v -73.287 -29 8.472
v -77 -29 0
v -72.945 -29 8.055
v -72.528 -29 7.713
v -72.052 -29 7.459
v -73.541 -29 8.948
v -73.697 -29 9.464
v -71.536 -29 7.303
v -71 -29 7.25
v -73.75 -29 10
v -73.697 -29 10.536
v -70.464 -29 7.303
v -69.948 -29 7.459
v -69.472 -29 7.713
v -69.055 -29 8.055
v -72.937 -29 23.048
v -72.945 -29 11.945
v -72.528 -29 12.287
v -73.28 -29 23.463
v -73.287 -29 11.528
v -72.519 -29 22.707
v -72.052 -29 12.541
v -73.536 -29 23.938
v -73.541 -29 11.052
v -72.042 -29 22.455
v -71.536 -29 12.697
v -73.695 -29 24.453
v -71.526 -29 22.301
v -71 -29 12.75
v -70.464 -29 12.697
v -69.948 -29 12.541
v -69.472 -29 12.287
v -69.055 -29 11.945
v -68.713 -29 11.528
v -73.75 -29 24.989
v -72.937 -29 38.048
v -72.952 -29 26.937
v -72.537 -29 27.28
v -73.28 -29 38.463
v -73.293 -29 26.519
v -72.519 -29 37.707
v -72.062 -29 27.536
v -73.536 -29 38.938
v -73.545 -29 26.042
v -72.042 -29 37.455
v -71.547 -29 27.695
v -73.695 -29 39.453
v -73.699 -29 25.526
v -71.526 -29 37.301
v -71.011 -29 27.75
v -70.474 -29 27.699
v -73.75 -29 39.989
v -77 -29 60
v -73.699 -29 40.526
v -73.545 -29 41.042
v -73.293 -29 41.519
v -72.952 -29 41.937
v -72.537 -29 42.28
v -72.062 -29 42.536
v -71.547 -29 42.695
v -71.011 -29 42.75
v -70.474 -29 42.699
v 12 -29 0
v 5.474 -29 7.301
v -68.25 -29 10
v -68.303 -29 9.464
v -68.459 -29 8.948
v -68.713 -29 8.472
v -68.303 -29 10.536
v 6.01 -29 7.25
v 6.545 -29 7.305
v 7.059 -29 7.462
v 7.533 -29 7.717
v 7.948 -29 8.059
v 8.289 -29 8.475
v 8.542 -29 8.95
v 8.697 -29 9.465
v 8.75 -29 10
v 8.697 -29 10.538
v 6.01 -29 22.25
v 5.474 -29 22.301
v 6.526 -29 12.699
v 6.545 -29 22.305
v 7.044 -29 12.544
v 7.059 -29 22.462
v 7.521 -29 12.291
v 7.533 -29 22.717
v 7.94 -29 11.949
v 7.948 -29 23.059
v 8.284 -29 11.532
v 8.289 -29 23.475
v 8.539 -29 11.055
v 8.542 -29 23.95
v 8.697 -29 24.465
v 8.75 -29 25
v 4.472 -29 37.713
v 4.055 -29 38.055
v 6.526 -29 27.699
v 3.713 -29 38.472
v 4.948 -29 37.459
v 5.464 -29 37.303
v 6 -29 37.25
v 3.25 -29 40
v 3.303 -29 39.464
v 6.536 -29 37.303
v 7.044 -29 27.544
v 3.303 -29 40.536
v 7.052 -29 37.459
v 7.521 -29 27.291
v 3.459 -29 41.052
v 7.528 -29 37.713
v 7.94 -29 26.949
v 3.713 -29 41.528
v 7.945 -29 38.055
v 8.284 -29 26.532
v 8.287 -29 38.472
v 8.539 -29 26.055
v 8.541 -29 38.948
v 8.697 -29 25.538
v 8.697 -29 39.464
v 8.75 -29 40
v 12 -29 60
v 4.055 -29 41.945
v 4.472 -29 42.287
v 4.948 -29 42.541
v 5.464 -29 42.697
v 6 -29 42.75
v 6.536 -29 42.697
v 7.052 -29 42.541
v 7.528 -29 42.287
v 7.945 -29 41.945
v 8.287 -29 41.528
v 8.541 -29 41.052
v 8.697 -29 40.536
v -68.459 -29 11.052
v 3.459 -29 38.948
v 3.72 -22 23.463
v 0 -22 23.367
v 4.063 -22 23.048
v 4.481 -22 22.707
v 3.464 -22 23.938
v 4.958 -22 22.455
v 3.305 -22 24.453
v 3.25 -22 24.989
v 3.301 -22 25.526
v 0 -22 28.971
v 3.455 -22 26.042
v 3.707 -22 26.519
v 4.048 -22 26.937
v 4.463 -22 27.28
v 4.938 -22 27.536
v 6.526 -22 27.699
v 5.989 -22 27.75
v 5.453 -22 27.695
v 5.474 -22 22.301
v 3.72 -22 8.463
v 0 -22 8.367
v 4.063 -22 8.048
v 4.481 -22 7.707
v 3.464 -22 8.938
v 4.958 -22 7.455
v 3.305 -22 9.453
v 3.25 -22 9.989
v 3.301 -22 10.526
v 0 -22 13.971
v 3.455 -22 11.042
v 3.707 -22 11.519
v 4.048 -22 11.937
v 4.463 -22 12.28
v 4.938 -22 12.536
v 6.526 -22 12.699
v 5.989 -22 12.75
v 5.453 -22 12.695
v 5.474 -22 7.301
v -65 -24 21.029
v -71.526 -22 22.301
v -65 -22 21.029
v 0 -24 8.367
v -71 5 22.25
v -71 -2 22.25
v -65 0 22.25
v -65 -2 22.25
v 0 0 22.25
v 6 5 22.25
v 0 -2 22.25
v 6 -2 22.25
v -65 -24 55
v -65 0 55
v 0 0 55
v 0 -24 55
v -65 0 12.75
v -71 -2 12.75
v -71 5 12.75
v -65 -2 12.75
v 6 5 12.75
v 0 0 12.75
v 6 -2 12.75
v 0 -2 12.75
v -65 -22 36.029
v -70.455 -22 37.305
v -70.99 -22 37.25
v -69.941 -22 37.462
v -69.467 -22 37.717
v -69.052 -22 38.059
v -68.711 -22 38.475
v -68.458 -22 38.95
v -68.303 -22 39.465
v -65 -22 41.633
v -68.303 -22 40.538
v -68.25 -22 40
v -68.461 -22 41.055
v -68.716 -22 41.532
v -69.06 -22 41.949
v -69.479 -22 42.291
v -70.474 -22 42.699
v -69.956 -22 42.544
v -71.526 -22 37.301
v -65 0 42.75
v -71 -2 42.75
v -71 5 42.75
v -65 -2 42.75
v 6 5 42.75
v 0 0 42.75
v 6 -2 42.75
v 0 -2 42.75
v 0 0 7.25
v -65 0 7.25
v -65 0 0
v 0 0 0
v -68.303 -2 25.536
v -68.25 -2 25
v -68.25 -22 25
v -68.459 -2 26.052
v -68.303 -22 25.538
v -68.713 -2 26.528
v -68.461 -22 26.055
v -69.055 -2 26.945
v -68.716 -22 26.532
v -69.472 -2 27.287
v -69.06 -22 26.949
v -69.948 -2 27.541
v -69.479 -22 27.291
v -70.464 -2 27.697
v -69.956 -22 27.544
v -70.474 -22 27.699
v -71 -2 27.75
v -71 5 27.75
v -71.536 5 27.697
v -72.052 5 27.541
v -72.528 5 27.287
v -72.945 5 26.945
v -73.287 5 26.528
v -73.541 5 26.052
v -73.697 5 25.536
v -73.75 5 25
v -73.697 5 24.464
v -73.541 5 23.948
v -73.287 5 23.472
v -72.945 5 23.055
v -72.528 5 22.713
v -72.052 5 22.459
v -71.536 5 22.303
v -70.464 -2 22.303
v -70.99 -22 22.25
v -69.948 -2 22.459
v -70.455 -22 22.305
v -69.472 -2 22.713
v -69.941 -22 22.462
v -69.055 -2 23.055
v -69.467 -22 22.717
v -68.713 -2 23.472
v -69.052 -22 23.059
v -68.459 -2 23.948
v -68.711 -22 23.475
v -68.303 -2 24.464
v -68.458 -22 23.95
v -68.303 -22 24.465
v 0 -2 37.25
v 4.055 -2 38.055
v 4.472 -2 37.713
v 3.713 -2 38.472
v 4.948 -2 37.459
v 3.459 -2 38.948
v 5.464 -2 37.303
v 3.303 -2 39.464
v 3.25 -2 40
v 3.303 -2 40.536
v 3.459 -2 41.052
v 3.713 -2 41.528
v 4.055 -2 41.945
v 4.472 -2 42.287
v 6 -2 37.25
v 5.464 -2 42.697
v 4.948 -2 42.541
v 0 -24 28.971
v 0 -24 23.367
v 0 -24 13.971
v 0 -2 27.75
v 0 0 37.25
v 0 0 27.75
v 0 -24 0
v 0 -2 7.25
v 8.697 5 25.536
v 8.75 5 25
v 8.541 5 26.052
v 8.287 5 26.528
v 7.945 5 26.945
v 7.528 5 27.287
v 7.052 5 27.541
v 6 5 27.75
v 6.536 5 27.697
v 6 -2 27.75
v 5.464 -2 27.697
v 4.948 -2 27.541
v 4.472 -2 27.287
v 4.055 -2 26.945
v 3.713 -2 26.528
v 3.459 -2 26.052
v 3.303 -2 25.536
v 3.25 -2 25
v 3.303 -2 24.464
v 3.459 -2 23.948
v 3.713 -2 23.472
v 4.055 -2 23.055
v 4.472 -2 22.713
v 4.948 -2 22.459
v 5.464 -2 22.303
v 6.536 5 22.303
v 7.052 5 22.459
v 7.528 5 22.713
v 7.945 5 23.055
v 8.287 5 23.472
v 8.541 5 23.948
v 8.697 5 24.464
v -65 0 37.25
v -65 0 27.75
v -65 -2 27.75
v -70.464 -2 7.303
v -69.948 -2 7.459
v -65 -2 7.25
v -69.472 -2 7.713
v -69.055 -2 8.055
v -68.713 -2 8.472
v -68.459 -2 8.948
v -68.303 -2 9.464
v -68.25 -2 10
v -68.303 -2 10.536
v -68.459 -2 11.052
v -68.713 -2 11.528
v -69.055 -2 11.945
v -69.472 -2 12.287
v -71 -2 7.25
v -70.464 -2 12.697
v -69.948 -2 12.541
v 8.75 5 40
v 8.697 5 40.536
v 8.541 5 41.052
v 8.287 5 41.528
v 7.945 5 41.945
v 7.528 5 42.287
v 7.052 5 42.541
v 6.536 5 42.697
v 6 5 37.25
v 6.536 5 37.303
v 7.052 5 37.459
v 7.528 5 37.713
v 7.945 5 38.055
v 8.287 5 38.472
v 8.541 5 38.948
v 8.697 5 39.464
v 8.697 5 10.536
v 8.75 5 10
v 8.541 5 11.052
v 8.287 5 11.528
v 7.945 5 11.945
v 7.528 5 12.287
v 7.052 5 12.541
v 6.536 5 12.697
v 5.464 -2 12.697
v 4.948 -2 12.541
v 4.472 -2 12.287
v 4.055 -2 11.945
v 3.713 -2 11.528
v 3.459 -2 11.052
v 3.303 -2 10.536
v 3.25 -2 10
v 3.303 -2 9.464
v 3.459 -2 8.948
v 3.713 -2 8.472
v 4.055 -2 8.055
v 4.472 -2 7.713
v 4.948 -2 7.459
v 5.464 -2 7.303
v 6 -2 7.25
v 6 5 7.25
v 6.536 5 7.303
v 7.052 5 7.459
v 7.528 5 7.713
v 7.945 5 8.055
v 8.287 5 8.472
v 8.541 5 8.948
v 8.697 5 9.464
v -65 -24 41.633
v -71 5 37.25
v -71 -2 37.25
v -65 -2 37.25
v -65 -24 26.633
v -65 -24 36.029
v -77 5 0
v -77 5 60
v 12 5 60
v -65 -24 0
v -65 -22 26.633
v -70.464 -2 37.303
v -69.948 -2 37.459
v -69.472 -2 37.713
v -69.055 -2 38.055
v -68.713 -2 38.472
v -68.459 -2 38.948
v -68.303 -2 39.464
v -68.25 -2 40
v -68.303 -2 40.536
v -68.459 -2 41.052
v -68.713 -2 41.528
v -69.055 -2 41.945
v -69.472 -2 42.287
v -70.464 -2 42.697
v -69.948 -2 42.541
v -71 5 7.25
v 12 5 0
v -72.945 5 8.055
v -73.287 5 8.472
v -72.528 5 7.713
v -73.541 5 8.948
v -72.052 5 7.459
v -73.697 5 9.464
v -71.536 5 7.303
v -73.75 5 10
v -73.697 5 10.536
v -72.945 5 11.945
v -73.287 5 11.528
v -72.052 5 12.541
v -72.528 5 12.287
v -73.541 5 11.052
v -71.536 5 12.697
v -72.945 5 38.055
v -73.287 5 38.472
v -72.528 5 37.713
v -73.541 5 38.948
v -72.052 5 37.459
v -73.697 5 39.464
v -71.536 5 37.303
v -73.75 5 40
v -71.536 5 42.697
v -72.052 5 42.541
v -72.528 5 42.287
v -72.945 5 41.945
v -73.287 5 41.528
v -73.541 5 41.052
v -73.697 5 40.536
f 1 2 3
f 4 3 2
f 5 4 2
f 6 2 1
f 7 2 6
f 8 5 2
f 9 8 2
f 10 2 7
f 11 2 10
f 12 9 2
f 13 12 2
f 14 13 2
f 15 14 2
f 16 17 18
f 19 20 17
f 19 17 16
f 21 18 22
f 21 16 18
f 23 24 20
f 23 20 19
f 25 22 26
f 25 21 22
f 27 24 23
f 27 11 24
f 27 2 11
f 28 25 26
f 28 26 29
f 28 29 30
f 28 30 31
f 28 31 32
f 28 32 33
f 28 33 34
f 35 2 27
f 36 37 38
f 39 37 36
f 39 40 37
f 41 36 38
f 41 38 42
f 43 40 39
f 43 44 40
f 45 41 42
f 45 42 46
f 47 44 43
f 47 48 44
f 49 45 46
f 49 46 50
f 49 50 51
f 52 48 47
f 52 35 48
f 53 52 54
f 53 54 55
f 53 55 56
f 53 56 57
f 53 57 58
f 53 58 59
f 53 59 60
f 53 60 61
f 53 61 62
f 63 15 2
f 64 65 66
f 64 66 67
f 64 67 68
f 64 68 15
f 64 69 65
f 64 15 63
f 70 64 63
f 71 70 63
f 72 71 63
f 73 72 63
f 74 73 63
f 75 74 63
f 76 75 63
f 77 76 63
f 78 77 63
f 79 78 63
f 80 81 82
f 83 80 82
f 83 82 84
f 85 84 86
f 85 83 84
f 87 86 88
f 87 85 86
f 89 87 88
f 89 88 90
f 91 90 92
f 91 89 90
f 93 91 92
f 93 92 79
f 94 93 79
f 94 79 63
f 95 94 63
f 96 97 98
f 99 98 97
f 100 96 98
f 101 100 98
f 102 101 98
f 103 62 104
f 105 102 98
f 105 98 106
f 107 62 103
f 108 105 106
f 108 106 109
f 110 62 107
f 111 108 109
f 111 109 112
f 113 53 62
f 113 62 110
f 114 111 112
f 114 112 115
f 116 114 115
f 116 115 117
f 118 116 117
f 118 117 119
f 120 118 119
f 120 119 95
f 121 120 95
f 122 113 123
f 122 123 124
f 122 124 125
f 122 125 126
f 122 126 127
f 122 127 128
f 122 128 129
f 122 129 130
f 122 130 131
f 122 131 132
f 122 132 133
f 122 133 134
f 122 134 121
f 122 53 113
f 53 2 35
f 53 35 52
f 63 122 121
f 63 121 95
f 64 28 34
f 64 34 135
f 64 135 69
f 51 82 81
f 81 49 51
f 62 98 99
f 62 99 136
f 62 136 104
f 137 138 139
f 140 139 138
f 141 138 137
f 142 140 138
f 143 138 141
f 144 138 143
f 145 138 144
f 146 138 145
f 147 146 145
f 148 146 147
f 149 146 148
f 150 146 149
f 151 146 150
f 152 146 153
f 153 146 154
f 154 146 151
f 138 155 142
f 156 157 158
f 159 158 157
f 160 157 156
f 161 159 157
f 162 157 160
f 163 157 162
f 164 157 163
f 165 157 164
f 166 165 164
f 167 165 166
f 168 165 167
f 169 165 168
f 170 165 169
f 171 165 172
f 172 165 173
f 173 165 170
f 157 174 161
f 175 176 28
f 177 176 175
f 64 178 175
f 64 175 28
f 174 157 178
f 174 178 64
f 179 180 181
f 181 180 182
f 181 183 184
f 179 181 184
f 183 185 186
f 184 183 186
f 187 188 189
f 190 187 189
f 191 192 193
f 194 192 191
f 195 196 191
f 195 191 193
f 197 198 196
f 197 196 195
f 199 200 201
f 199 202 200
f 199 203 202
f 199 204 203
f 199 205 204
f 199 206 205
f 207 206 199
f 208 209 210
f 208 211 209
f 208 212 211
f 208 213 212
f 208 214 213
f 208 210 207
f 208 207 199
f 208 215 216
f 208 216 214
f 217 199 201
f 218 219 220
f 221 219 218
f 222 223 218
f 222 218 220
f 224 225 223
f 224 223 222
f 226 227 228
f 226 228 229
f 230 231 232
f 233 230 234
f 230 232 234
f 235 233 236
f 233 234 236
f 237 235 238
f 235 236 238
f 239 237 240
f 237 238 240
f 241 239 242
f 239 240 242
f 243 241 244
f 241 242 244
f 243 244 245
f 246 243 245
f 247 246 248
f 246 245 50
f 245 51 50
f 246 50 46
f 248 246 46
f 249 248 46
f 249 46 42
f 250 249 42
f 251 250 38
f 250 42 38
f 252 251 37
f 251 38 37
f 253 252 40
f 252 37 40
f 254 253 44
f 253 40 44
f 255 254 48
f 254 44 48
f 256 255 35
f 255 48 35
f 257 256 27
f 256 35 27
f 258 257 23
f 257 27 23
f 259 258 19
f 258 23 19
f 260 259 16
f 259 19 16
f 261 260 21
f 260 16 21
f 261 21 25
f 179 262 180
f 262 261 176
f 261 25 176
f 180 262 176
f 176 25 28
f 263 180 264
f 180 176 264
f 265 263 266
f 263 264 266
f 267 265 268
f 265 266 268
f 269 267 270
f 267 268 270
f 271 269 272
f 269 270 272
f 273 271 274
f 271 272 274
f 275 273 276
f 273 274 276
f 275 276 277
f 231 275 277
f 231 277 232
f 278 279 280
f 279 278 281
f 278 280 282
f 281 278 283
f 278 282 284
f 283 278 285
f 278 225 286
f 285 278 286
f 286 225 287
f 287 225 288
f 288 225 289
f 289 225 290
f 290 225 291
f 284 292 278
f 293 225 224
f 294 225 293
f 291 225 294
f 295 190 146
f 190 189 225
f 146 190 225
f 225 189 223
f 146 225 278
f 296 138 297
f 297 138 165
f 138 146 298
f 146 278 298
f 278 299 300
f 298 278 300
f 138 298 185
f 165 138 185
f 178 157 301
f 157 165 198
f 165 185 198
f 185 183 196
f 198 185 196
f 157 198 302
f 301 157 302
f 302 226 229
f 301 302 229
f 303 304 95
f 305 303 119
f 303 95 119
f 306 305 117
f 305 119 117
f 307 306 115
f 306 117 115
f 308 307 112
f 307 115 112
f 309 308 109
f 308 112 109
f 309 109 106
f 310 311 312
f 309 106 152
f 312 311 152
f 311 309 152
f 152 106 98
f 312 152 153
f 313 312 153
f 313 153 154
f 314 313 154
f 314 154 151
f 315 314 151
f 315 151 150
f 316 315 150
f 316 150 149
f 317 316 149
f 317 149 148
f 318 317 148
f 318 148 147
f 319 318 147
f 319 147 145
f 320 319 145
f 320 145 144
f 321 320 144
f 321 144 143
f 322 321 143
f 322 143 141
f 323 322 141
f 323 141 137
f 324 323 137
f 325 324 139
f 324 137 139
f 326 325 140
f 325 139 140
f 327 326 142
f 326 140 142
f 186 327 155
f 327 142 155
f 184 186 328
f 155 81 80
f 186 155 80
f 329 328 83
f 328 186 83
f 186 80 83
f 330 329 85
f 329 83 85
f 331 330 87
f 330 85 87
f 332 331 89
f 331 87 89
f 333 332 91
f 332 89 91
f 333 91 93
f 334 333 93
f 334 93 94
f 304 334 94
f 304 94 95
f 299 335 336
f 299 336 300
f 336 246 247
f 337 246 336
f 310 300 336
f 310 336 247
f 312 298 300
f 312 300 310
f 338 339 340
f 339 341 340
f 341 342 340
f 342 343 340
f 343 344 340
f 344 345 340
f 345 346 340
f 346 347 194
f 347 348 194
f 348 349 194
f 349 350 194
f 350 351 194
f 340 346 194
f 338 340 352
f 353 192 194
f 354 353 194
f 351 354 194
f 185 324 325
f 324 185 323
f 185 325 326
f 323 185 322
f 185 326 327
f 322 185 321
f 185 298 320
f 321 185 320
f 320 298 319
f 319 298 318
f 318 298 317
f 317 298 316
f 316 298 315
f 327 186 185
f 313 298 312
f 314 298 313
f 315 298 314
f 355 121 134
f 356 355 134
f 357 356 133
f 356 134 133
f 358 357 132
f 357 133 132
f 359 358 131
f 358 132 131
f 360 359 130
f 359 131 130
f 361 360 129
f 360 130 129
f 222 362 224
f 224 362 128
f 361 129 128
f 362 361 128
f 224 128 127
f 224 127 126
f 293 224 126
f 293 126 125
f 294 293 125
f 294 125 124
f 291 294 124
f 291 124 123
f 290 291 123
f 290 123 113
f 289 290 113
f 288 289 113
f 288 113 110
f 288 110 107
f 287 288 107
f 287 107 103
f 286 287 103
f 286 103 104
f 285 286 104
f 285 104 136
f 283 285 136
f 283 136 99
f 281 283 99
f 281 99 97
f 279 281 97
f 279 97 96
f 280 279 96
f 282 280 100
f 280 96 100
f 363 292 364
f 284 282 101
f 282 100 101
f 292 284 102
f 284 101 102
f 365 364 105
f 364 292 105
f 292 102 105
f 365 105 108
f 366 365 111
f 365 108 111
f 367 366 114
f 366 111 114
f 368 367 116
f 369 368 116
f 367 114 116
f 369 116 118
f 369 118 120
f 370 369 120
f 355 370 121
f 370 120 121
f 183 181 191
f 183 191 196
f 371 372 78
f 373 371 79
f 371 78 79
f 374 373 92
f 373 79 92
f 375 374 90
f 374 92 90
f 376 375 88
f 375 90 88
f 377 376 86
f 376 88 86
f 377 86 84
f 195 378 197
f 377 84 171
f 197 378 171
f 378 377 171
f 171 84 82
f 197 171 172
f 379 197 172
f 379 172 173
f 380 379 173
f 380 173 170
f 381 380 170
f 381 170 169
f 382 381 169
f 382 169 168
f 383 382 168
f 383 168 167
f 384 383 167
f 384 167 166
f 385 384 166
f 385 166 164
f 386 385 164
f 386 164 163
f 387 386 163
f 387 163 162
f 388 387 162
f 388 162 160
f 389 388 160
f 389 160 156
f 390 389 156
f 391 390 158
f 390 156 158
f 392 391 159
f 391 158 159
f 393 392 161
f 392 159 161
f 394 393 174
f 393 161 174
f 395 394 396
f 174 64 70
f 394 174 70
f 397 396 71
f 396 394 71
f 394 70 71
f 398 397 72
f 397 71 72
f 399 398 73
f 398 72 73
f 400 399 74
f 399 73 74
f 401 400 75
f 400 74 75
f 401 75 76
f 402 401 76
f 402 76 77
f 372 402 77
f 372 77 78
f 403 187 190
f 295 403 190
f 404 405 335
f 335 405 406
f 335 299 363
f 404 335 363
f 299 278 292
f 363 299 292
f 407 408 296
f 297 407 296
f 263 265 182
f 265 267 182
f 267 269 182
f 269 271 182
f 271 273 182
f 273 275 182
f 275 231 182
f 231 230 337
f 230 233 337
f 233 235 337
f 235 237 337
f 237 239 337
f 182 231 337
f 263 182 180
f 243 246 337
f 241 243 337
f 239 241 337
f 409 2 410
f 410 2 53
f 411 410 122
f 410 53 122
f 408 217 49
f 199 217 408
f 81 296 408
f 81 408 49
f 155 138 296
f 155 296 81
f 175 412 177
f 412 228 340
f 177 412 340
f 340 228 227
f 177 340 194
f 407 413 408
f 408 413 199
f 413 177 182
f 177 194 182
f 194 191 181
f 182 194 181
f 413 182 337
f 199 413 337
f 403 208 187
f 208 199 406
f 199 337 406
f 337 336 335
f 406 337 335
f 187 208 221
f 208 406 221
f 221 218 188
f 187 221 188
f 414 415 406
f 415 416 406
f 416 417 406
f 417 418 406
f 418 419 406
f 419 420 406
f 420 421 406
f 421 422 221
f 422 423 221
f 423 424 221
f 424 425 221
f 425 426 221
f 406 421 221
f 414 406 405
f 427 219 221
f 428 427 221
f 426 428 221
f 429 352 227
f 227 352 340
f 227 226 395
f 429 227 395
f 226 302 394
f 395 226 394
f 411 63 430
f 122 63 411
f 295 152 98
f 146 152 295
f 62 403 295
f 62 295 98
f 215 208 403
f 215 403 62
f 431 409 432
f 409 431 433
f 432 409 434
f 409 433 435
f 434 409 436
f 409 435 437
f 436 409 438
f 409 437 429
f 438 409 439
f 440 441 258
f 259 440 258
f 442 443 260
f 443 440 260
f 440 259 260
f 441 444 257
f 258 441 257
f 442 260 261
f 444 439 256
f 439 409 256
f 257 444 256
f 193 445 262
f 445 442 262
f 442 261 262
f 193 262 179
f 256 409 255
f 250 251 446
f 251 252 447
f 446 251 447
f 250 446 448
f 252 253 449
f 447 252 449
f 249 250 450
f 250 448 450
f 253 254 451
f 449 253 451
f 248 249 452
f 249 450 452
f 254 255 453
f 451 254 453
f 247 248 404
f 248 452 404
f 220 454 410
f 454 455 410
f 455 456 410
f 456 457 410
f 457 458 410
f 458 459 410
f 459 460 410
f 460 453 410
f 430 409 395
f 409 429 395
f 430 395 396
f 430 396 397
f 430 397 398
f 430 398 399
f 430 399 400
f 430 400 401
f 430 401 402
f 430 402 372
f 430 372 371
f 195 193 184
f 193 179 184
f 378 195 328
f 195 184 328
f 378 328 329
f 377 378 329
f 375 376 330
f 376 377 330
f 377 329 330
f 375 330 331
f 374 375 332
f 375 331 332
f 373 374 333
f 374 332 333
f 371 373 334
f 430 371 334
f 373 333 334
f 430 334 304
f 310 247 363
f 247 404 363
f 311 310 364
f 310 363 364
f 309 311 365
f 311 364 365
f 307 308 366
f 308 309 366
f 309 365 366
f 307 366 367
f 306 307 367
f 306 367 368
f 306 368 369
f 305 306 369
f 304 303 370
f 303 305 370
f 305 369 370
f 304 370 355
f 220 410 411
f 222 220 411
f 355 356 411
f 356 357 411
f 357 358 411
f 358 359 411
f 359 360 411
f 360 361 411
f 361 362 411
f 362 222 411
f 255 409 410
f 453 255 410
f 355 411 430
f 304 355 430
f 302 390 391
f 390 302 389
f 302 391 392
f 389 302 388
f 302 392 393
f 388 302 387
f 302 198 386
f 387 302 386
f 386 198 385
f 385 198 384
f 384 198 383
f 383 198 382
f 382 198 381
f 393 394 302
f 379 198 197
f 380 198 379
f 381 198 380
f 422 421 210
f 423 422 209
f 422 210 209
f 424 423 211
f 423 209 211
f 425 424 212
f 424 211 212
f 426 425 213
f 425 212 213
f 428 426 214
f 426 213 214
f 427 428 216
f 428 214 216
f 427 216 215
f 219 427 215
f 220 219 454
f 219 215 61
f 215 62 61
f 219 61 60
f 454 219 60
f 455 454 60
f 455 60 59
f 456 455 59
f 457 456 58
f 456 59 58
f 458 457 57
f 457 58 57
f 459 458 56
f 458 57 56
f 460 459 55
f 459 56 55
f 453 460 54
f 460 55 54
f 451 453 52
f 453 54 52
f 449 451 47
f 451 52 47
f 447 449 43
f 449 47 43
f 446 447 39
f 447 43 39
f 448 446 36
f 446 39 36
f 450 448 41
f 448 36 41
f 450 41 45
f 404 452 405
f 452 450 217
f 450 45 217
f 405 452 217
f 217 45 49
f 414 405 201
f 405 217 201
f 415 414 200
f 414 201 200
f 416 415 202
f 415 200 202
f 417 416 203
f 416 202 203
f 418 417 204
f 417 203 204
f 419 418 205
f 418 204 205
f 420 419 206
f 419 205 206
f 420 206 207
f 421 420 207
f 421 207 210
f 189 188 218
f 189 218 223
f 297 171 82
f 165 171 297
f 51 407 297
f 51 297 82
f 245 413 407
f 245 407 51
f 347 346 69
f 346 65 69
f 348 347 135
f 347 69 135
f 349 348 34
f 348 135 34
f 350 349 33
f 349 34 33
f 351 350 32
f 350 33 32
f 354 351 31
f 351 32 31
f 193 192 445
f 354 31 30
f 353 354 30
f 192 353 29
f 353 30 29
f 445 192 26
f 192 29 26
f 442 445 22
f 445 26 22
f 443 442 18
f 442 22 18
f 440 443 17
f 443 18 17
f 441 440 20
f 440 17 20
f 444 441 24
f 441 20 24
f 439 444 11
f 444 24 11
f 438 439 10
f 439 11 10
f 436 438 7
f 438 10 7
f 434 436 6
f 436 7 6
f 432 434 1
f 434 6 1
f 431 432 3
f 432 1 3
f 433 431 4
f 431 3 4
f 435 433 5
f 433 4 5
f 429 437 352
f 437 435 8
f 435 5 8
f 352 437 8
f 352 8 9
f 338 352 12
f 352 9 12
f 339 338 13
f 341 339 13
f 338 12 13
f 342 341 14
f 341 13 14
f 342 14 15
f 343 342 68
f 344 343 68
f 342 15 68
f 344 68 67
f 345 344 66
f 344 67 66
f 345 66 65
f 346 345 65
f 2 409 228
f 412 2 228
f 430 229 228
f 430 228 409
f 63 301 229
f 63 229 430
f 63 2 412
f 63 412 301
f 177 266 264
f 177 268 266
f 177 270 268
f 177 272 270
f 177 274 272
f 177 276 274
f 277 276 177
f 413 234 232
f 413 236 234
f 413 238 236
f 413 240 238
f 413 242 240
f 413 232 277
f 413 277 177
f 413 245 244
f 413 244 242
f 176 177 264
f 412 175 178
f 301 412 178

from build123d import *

# Parameters (mm, degrees)
F1_DEPTH      = 24
F3_START      = 24
F2_W          = 89
F2_H          = 60
F3_DEPTH      = 5
F4_DEPTH      = 5
F5_R          = 2.75
F6_DEPTH      = 29.001
F6_DEPTH_BACK = 5.001
F7_W          = 77
F7_H          = 5.5
F8_DEPTH      = 5
F8_DEPTH_BACK = 2
F10_START     = 22
F10_DEPTH     = 7


with BuildPart() as f1:
    # F0 (on Front) → F1 (new body)
    with BuildSketch(Plane.XZ):
        Polygon((12, 60), (-77, 60), (-77, 0), (-65, 0), (-65, 55), (0, 55), (0, 0), (12, 0), align=None)
    extrude(amount=F1_DEPTH)

    # F2 (on Front) → F3 (join)
    with BuildSketch(Plane.XZ.offset(F3_START)):
        with Locations((-32.5, 30)):
            Rectangle(F2_W, F2_H)
    extrude(amount=F3_DEPTH)

    # F2 (on Front) → F4 (join)
    with BuildSketch(Plane.XZ):
        with Locations((-32.5, 30)):
            Rectangle(F2_W, F2_H)
    extrude(amount=-F4_DEPTH)

    # F5 (on Front) → F6 (cut, two sides)
    with BuildSketch(Plane.XZ) as f6_sk:
        with Locations((-71, 25)):
            Circle(F5_R)
        with Locations((-71, 10)):
            Circle(F5_R)
        with Locations((6, 10)):
            Circle(F5_R)
        with Locations((6, 25)):
            Circle(F5_R)
        with Locations((6, 40)):
            Circle(F5_R)
        with Locations((-71, 40)):
            Circle(F5_R)
    extrude(amount=F6_DEPTH, mode=Mode.SUBTRACT)
    extrude(f6_sk.sketch, amount=-F6_DEPTH_BACK, mode=Mode.SUBTRACT)

    # F7 (on Front) → F8 (cut, two sides)
    with BuildSketch(Plane.XZ) as f8_sk:
        with Locations((-32.5, 40)):
            Rectangle(F7_W, F7_H)
        with Locations((-32.5, 25)):
            Rectangle(F7_W, F7_H)
        with Locations((-32.5, 10)):
            Rectangle(F7_W, F7_H)
    extrude(amount=-F8_DEPTH, mode=Mode.SUBTRACT)
    extrude(f8_sk.sketch, amount=F8_DEPTH_BACK, mode=Mode.SUBTRACT)

    # F9 (on Front) → F10 (cut)
    with BuildSketch(Plane.XZ.offset(F10_START)):
        Polygon((-70.4741701855, 27.6992597145), (-71.5258298145, 22.3007402855), (5.4741701855, 7.3007402855), (6.5258298145, 12.6992597145), align=None)
        Polygon((-70.4741701855, 42.6992597145), (-71.5258298145, 37.3007402855), (5.4741701855, 22.3007402855), (6.5258298145, 27.6992597145), align=None)
    extrude(amount=F10_DEPTH, mode=Mode.SUBTRACT)


solid = f1.part
